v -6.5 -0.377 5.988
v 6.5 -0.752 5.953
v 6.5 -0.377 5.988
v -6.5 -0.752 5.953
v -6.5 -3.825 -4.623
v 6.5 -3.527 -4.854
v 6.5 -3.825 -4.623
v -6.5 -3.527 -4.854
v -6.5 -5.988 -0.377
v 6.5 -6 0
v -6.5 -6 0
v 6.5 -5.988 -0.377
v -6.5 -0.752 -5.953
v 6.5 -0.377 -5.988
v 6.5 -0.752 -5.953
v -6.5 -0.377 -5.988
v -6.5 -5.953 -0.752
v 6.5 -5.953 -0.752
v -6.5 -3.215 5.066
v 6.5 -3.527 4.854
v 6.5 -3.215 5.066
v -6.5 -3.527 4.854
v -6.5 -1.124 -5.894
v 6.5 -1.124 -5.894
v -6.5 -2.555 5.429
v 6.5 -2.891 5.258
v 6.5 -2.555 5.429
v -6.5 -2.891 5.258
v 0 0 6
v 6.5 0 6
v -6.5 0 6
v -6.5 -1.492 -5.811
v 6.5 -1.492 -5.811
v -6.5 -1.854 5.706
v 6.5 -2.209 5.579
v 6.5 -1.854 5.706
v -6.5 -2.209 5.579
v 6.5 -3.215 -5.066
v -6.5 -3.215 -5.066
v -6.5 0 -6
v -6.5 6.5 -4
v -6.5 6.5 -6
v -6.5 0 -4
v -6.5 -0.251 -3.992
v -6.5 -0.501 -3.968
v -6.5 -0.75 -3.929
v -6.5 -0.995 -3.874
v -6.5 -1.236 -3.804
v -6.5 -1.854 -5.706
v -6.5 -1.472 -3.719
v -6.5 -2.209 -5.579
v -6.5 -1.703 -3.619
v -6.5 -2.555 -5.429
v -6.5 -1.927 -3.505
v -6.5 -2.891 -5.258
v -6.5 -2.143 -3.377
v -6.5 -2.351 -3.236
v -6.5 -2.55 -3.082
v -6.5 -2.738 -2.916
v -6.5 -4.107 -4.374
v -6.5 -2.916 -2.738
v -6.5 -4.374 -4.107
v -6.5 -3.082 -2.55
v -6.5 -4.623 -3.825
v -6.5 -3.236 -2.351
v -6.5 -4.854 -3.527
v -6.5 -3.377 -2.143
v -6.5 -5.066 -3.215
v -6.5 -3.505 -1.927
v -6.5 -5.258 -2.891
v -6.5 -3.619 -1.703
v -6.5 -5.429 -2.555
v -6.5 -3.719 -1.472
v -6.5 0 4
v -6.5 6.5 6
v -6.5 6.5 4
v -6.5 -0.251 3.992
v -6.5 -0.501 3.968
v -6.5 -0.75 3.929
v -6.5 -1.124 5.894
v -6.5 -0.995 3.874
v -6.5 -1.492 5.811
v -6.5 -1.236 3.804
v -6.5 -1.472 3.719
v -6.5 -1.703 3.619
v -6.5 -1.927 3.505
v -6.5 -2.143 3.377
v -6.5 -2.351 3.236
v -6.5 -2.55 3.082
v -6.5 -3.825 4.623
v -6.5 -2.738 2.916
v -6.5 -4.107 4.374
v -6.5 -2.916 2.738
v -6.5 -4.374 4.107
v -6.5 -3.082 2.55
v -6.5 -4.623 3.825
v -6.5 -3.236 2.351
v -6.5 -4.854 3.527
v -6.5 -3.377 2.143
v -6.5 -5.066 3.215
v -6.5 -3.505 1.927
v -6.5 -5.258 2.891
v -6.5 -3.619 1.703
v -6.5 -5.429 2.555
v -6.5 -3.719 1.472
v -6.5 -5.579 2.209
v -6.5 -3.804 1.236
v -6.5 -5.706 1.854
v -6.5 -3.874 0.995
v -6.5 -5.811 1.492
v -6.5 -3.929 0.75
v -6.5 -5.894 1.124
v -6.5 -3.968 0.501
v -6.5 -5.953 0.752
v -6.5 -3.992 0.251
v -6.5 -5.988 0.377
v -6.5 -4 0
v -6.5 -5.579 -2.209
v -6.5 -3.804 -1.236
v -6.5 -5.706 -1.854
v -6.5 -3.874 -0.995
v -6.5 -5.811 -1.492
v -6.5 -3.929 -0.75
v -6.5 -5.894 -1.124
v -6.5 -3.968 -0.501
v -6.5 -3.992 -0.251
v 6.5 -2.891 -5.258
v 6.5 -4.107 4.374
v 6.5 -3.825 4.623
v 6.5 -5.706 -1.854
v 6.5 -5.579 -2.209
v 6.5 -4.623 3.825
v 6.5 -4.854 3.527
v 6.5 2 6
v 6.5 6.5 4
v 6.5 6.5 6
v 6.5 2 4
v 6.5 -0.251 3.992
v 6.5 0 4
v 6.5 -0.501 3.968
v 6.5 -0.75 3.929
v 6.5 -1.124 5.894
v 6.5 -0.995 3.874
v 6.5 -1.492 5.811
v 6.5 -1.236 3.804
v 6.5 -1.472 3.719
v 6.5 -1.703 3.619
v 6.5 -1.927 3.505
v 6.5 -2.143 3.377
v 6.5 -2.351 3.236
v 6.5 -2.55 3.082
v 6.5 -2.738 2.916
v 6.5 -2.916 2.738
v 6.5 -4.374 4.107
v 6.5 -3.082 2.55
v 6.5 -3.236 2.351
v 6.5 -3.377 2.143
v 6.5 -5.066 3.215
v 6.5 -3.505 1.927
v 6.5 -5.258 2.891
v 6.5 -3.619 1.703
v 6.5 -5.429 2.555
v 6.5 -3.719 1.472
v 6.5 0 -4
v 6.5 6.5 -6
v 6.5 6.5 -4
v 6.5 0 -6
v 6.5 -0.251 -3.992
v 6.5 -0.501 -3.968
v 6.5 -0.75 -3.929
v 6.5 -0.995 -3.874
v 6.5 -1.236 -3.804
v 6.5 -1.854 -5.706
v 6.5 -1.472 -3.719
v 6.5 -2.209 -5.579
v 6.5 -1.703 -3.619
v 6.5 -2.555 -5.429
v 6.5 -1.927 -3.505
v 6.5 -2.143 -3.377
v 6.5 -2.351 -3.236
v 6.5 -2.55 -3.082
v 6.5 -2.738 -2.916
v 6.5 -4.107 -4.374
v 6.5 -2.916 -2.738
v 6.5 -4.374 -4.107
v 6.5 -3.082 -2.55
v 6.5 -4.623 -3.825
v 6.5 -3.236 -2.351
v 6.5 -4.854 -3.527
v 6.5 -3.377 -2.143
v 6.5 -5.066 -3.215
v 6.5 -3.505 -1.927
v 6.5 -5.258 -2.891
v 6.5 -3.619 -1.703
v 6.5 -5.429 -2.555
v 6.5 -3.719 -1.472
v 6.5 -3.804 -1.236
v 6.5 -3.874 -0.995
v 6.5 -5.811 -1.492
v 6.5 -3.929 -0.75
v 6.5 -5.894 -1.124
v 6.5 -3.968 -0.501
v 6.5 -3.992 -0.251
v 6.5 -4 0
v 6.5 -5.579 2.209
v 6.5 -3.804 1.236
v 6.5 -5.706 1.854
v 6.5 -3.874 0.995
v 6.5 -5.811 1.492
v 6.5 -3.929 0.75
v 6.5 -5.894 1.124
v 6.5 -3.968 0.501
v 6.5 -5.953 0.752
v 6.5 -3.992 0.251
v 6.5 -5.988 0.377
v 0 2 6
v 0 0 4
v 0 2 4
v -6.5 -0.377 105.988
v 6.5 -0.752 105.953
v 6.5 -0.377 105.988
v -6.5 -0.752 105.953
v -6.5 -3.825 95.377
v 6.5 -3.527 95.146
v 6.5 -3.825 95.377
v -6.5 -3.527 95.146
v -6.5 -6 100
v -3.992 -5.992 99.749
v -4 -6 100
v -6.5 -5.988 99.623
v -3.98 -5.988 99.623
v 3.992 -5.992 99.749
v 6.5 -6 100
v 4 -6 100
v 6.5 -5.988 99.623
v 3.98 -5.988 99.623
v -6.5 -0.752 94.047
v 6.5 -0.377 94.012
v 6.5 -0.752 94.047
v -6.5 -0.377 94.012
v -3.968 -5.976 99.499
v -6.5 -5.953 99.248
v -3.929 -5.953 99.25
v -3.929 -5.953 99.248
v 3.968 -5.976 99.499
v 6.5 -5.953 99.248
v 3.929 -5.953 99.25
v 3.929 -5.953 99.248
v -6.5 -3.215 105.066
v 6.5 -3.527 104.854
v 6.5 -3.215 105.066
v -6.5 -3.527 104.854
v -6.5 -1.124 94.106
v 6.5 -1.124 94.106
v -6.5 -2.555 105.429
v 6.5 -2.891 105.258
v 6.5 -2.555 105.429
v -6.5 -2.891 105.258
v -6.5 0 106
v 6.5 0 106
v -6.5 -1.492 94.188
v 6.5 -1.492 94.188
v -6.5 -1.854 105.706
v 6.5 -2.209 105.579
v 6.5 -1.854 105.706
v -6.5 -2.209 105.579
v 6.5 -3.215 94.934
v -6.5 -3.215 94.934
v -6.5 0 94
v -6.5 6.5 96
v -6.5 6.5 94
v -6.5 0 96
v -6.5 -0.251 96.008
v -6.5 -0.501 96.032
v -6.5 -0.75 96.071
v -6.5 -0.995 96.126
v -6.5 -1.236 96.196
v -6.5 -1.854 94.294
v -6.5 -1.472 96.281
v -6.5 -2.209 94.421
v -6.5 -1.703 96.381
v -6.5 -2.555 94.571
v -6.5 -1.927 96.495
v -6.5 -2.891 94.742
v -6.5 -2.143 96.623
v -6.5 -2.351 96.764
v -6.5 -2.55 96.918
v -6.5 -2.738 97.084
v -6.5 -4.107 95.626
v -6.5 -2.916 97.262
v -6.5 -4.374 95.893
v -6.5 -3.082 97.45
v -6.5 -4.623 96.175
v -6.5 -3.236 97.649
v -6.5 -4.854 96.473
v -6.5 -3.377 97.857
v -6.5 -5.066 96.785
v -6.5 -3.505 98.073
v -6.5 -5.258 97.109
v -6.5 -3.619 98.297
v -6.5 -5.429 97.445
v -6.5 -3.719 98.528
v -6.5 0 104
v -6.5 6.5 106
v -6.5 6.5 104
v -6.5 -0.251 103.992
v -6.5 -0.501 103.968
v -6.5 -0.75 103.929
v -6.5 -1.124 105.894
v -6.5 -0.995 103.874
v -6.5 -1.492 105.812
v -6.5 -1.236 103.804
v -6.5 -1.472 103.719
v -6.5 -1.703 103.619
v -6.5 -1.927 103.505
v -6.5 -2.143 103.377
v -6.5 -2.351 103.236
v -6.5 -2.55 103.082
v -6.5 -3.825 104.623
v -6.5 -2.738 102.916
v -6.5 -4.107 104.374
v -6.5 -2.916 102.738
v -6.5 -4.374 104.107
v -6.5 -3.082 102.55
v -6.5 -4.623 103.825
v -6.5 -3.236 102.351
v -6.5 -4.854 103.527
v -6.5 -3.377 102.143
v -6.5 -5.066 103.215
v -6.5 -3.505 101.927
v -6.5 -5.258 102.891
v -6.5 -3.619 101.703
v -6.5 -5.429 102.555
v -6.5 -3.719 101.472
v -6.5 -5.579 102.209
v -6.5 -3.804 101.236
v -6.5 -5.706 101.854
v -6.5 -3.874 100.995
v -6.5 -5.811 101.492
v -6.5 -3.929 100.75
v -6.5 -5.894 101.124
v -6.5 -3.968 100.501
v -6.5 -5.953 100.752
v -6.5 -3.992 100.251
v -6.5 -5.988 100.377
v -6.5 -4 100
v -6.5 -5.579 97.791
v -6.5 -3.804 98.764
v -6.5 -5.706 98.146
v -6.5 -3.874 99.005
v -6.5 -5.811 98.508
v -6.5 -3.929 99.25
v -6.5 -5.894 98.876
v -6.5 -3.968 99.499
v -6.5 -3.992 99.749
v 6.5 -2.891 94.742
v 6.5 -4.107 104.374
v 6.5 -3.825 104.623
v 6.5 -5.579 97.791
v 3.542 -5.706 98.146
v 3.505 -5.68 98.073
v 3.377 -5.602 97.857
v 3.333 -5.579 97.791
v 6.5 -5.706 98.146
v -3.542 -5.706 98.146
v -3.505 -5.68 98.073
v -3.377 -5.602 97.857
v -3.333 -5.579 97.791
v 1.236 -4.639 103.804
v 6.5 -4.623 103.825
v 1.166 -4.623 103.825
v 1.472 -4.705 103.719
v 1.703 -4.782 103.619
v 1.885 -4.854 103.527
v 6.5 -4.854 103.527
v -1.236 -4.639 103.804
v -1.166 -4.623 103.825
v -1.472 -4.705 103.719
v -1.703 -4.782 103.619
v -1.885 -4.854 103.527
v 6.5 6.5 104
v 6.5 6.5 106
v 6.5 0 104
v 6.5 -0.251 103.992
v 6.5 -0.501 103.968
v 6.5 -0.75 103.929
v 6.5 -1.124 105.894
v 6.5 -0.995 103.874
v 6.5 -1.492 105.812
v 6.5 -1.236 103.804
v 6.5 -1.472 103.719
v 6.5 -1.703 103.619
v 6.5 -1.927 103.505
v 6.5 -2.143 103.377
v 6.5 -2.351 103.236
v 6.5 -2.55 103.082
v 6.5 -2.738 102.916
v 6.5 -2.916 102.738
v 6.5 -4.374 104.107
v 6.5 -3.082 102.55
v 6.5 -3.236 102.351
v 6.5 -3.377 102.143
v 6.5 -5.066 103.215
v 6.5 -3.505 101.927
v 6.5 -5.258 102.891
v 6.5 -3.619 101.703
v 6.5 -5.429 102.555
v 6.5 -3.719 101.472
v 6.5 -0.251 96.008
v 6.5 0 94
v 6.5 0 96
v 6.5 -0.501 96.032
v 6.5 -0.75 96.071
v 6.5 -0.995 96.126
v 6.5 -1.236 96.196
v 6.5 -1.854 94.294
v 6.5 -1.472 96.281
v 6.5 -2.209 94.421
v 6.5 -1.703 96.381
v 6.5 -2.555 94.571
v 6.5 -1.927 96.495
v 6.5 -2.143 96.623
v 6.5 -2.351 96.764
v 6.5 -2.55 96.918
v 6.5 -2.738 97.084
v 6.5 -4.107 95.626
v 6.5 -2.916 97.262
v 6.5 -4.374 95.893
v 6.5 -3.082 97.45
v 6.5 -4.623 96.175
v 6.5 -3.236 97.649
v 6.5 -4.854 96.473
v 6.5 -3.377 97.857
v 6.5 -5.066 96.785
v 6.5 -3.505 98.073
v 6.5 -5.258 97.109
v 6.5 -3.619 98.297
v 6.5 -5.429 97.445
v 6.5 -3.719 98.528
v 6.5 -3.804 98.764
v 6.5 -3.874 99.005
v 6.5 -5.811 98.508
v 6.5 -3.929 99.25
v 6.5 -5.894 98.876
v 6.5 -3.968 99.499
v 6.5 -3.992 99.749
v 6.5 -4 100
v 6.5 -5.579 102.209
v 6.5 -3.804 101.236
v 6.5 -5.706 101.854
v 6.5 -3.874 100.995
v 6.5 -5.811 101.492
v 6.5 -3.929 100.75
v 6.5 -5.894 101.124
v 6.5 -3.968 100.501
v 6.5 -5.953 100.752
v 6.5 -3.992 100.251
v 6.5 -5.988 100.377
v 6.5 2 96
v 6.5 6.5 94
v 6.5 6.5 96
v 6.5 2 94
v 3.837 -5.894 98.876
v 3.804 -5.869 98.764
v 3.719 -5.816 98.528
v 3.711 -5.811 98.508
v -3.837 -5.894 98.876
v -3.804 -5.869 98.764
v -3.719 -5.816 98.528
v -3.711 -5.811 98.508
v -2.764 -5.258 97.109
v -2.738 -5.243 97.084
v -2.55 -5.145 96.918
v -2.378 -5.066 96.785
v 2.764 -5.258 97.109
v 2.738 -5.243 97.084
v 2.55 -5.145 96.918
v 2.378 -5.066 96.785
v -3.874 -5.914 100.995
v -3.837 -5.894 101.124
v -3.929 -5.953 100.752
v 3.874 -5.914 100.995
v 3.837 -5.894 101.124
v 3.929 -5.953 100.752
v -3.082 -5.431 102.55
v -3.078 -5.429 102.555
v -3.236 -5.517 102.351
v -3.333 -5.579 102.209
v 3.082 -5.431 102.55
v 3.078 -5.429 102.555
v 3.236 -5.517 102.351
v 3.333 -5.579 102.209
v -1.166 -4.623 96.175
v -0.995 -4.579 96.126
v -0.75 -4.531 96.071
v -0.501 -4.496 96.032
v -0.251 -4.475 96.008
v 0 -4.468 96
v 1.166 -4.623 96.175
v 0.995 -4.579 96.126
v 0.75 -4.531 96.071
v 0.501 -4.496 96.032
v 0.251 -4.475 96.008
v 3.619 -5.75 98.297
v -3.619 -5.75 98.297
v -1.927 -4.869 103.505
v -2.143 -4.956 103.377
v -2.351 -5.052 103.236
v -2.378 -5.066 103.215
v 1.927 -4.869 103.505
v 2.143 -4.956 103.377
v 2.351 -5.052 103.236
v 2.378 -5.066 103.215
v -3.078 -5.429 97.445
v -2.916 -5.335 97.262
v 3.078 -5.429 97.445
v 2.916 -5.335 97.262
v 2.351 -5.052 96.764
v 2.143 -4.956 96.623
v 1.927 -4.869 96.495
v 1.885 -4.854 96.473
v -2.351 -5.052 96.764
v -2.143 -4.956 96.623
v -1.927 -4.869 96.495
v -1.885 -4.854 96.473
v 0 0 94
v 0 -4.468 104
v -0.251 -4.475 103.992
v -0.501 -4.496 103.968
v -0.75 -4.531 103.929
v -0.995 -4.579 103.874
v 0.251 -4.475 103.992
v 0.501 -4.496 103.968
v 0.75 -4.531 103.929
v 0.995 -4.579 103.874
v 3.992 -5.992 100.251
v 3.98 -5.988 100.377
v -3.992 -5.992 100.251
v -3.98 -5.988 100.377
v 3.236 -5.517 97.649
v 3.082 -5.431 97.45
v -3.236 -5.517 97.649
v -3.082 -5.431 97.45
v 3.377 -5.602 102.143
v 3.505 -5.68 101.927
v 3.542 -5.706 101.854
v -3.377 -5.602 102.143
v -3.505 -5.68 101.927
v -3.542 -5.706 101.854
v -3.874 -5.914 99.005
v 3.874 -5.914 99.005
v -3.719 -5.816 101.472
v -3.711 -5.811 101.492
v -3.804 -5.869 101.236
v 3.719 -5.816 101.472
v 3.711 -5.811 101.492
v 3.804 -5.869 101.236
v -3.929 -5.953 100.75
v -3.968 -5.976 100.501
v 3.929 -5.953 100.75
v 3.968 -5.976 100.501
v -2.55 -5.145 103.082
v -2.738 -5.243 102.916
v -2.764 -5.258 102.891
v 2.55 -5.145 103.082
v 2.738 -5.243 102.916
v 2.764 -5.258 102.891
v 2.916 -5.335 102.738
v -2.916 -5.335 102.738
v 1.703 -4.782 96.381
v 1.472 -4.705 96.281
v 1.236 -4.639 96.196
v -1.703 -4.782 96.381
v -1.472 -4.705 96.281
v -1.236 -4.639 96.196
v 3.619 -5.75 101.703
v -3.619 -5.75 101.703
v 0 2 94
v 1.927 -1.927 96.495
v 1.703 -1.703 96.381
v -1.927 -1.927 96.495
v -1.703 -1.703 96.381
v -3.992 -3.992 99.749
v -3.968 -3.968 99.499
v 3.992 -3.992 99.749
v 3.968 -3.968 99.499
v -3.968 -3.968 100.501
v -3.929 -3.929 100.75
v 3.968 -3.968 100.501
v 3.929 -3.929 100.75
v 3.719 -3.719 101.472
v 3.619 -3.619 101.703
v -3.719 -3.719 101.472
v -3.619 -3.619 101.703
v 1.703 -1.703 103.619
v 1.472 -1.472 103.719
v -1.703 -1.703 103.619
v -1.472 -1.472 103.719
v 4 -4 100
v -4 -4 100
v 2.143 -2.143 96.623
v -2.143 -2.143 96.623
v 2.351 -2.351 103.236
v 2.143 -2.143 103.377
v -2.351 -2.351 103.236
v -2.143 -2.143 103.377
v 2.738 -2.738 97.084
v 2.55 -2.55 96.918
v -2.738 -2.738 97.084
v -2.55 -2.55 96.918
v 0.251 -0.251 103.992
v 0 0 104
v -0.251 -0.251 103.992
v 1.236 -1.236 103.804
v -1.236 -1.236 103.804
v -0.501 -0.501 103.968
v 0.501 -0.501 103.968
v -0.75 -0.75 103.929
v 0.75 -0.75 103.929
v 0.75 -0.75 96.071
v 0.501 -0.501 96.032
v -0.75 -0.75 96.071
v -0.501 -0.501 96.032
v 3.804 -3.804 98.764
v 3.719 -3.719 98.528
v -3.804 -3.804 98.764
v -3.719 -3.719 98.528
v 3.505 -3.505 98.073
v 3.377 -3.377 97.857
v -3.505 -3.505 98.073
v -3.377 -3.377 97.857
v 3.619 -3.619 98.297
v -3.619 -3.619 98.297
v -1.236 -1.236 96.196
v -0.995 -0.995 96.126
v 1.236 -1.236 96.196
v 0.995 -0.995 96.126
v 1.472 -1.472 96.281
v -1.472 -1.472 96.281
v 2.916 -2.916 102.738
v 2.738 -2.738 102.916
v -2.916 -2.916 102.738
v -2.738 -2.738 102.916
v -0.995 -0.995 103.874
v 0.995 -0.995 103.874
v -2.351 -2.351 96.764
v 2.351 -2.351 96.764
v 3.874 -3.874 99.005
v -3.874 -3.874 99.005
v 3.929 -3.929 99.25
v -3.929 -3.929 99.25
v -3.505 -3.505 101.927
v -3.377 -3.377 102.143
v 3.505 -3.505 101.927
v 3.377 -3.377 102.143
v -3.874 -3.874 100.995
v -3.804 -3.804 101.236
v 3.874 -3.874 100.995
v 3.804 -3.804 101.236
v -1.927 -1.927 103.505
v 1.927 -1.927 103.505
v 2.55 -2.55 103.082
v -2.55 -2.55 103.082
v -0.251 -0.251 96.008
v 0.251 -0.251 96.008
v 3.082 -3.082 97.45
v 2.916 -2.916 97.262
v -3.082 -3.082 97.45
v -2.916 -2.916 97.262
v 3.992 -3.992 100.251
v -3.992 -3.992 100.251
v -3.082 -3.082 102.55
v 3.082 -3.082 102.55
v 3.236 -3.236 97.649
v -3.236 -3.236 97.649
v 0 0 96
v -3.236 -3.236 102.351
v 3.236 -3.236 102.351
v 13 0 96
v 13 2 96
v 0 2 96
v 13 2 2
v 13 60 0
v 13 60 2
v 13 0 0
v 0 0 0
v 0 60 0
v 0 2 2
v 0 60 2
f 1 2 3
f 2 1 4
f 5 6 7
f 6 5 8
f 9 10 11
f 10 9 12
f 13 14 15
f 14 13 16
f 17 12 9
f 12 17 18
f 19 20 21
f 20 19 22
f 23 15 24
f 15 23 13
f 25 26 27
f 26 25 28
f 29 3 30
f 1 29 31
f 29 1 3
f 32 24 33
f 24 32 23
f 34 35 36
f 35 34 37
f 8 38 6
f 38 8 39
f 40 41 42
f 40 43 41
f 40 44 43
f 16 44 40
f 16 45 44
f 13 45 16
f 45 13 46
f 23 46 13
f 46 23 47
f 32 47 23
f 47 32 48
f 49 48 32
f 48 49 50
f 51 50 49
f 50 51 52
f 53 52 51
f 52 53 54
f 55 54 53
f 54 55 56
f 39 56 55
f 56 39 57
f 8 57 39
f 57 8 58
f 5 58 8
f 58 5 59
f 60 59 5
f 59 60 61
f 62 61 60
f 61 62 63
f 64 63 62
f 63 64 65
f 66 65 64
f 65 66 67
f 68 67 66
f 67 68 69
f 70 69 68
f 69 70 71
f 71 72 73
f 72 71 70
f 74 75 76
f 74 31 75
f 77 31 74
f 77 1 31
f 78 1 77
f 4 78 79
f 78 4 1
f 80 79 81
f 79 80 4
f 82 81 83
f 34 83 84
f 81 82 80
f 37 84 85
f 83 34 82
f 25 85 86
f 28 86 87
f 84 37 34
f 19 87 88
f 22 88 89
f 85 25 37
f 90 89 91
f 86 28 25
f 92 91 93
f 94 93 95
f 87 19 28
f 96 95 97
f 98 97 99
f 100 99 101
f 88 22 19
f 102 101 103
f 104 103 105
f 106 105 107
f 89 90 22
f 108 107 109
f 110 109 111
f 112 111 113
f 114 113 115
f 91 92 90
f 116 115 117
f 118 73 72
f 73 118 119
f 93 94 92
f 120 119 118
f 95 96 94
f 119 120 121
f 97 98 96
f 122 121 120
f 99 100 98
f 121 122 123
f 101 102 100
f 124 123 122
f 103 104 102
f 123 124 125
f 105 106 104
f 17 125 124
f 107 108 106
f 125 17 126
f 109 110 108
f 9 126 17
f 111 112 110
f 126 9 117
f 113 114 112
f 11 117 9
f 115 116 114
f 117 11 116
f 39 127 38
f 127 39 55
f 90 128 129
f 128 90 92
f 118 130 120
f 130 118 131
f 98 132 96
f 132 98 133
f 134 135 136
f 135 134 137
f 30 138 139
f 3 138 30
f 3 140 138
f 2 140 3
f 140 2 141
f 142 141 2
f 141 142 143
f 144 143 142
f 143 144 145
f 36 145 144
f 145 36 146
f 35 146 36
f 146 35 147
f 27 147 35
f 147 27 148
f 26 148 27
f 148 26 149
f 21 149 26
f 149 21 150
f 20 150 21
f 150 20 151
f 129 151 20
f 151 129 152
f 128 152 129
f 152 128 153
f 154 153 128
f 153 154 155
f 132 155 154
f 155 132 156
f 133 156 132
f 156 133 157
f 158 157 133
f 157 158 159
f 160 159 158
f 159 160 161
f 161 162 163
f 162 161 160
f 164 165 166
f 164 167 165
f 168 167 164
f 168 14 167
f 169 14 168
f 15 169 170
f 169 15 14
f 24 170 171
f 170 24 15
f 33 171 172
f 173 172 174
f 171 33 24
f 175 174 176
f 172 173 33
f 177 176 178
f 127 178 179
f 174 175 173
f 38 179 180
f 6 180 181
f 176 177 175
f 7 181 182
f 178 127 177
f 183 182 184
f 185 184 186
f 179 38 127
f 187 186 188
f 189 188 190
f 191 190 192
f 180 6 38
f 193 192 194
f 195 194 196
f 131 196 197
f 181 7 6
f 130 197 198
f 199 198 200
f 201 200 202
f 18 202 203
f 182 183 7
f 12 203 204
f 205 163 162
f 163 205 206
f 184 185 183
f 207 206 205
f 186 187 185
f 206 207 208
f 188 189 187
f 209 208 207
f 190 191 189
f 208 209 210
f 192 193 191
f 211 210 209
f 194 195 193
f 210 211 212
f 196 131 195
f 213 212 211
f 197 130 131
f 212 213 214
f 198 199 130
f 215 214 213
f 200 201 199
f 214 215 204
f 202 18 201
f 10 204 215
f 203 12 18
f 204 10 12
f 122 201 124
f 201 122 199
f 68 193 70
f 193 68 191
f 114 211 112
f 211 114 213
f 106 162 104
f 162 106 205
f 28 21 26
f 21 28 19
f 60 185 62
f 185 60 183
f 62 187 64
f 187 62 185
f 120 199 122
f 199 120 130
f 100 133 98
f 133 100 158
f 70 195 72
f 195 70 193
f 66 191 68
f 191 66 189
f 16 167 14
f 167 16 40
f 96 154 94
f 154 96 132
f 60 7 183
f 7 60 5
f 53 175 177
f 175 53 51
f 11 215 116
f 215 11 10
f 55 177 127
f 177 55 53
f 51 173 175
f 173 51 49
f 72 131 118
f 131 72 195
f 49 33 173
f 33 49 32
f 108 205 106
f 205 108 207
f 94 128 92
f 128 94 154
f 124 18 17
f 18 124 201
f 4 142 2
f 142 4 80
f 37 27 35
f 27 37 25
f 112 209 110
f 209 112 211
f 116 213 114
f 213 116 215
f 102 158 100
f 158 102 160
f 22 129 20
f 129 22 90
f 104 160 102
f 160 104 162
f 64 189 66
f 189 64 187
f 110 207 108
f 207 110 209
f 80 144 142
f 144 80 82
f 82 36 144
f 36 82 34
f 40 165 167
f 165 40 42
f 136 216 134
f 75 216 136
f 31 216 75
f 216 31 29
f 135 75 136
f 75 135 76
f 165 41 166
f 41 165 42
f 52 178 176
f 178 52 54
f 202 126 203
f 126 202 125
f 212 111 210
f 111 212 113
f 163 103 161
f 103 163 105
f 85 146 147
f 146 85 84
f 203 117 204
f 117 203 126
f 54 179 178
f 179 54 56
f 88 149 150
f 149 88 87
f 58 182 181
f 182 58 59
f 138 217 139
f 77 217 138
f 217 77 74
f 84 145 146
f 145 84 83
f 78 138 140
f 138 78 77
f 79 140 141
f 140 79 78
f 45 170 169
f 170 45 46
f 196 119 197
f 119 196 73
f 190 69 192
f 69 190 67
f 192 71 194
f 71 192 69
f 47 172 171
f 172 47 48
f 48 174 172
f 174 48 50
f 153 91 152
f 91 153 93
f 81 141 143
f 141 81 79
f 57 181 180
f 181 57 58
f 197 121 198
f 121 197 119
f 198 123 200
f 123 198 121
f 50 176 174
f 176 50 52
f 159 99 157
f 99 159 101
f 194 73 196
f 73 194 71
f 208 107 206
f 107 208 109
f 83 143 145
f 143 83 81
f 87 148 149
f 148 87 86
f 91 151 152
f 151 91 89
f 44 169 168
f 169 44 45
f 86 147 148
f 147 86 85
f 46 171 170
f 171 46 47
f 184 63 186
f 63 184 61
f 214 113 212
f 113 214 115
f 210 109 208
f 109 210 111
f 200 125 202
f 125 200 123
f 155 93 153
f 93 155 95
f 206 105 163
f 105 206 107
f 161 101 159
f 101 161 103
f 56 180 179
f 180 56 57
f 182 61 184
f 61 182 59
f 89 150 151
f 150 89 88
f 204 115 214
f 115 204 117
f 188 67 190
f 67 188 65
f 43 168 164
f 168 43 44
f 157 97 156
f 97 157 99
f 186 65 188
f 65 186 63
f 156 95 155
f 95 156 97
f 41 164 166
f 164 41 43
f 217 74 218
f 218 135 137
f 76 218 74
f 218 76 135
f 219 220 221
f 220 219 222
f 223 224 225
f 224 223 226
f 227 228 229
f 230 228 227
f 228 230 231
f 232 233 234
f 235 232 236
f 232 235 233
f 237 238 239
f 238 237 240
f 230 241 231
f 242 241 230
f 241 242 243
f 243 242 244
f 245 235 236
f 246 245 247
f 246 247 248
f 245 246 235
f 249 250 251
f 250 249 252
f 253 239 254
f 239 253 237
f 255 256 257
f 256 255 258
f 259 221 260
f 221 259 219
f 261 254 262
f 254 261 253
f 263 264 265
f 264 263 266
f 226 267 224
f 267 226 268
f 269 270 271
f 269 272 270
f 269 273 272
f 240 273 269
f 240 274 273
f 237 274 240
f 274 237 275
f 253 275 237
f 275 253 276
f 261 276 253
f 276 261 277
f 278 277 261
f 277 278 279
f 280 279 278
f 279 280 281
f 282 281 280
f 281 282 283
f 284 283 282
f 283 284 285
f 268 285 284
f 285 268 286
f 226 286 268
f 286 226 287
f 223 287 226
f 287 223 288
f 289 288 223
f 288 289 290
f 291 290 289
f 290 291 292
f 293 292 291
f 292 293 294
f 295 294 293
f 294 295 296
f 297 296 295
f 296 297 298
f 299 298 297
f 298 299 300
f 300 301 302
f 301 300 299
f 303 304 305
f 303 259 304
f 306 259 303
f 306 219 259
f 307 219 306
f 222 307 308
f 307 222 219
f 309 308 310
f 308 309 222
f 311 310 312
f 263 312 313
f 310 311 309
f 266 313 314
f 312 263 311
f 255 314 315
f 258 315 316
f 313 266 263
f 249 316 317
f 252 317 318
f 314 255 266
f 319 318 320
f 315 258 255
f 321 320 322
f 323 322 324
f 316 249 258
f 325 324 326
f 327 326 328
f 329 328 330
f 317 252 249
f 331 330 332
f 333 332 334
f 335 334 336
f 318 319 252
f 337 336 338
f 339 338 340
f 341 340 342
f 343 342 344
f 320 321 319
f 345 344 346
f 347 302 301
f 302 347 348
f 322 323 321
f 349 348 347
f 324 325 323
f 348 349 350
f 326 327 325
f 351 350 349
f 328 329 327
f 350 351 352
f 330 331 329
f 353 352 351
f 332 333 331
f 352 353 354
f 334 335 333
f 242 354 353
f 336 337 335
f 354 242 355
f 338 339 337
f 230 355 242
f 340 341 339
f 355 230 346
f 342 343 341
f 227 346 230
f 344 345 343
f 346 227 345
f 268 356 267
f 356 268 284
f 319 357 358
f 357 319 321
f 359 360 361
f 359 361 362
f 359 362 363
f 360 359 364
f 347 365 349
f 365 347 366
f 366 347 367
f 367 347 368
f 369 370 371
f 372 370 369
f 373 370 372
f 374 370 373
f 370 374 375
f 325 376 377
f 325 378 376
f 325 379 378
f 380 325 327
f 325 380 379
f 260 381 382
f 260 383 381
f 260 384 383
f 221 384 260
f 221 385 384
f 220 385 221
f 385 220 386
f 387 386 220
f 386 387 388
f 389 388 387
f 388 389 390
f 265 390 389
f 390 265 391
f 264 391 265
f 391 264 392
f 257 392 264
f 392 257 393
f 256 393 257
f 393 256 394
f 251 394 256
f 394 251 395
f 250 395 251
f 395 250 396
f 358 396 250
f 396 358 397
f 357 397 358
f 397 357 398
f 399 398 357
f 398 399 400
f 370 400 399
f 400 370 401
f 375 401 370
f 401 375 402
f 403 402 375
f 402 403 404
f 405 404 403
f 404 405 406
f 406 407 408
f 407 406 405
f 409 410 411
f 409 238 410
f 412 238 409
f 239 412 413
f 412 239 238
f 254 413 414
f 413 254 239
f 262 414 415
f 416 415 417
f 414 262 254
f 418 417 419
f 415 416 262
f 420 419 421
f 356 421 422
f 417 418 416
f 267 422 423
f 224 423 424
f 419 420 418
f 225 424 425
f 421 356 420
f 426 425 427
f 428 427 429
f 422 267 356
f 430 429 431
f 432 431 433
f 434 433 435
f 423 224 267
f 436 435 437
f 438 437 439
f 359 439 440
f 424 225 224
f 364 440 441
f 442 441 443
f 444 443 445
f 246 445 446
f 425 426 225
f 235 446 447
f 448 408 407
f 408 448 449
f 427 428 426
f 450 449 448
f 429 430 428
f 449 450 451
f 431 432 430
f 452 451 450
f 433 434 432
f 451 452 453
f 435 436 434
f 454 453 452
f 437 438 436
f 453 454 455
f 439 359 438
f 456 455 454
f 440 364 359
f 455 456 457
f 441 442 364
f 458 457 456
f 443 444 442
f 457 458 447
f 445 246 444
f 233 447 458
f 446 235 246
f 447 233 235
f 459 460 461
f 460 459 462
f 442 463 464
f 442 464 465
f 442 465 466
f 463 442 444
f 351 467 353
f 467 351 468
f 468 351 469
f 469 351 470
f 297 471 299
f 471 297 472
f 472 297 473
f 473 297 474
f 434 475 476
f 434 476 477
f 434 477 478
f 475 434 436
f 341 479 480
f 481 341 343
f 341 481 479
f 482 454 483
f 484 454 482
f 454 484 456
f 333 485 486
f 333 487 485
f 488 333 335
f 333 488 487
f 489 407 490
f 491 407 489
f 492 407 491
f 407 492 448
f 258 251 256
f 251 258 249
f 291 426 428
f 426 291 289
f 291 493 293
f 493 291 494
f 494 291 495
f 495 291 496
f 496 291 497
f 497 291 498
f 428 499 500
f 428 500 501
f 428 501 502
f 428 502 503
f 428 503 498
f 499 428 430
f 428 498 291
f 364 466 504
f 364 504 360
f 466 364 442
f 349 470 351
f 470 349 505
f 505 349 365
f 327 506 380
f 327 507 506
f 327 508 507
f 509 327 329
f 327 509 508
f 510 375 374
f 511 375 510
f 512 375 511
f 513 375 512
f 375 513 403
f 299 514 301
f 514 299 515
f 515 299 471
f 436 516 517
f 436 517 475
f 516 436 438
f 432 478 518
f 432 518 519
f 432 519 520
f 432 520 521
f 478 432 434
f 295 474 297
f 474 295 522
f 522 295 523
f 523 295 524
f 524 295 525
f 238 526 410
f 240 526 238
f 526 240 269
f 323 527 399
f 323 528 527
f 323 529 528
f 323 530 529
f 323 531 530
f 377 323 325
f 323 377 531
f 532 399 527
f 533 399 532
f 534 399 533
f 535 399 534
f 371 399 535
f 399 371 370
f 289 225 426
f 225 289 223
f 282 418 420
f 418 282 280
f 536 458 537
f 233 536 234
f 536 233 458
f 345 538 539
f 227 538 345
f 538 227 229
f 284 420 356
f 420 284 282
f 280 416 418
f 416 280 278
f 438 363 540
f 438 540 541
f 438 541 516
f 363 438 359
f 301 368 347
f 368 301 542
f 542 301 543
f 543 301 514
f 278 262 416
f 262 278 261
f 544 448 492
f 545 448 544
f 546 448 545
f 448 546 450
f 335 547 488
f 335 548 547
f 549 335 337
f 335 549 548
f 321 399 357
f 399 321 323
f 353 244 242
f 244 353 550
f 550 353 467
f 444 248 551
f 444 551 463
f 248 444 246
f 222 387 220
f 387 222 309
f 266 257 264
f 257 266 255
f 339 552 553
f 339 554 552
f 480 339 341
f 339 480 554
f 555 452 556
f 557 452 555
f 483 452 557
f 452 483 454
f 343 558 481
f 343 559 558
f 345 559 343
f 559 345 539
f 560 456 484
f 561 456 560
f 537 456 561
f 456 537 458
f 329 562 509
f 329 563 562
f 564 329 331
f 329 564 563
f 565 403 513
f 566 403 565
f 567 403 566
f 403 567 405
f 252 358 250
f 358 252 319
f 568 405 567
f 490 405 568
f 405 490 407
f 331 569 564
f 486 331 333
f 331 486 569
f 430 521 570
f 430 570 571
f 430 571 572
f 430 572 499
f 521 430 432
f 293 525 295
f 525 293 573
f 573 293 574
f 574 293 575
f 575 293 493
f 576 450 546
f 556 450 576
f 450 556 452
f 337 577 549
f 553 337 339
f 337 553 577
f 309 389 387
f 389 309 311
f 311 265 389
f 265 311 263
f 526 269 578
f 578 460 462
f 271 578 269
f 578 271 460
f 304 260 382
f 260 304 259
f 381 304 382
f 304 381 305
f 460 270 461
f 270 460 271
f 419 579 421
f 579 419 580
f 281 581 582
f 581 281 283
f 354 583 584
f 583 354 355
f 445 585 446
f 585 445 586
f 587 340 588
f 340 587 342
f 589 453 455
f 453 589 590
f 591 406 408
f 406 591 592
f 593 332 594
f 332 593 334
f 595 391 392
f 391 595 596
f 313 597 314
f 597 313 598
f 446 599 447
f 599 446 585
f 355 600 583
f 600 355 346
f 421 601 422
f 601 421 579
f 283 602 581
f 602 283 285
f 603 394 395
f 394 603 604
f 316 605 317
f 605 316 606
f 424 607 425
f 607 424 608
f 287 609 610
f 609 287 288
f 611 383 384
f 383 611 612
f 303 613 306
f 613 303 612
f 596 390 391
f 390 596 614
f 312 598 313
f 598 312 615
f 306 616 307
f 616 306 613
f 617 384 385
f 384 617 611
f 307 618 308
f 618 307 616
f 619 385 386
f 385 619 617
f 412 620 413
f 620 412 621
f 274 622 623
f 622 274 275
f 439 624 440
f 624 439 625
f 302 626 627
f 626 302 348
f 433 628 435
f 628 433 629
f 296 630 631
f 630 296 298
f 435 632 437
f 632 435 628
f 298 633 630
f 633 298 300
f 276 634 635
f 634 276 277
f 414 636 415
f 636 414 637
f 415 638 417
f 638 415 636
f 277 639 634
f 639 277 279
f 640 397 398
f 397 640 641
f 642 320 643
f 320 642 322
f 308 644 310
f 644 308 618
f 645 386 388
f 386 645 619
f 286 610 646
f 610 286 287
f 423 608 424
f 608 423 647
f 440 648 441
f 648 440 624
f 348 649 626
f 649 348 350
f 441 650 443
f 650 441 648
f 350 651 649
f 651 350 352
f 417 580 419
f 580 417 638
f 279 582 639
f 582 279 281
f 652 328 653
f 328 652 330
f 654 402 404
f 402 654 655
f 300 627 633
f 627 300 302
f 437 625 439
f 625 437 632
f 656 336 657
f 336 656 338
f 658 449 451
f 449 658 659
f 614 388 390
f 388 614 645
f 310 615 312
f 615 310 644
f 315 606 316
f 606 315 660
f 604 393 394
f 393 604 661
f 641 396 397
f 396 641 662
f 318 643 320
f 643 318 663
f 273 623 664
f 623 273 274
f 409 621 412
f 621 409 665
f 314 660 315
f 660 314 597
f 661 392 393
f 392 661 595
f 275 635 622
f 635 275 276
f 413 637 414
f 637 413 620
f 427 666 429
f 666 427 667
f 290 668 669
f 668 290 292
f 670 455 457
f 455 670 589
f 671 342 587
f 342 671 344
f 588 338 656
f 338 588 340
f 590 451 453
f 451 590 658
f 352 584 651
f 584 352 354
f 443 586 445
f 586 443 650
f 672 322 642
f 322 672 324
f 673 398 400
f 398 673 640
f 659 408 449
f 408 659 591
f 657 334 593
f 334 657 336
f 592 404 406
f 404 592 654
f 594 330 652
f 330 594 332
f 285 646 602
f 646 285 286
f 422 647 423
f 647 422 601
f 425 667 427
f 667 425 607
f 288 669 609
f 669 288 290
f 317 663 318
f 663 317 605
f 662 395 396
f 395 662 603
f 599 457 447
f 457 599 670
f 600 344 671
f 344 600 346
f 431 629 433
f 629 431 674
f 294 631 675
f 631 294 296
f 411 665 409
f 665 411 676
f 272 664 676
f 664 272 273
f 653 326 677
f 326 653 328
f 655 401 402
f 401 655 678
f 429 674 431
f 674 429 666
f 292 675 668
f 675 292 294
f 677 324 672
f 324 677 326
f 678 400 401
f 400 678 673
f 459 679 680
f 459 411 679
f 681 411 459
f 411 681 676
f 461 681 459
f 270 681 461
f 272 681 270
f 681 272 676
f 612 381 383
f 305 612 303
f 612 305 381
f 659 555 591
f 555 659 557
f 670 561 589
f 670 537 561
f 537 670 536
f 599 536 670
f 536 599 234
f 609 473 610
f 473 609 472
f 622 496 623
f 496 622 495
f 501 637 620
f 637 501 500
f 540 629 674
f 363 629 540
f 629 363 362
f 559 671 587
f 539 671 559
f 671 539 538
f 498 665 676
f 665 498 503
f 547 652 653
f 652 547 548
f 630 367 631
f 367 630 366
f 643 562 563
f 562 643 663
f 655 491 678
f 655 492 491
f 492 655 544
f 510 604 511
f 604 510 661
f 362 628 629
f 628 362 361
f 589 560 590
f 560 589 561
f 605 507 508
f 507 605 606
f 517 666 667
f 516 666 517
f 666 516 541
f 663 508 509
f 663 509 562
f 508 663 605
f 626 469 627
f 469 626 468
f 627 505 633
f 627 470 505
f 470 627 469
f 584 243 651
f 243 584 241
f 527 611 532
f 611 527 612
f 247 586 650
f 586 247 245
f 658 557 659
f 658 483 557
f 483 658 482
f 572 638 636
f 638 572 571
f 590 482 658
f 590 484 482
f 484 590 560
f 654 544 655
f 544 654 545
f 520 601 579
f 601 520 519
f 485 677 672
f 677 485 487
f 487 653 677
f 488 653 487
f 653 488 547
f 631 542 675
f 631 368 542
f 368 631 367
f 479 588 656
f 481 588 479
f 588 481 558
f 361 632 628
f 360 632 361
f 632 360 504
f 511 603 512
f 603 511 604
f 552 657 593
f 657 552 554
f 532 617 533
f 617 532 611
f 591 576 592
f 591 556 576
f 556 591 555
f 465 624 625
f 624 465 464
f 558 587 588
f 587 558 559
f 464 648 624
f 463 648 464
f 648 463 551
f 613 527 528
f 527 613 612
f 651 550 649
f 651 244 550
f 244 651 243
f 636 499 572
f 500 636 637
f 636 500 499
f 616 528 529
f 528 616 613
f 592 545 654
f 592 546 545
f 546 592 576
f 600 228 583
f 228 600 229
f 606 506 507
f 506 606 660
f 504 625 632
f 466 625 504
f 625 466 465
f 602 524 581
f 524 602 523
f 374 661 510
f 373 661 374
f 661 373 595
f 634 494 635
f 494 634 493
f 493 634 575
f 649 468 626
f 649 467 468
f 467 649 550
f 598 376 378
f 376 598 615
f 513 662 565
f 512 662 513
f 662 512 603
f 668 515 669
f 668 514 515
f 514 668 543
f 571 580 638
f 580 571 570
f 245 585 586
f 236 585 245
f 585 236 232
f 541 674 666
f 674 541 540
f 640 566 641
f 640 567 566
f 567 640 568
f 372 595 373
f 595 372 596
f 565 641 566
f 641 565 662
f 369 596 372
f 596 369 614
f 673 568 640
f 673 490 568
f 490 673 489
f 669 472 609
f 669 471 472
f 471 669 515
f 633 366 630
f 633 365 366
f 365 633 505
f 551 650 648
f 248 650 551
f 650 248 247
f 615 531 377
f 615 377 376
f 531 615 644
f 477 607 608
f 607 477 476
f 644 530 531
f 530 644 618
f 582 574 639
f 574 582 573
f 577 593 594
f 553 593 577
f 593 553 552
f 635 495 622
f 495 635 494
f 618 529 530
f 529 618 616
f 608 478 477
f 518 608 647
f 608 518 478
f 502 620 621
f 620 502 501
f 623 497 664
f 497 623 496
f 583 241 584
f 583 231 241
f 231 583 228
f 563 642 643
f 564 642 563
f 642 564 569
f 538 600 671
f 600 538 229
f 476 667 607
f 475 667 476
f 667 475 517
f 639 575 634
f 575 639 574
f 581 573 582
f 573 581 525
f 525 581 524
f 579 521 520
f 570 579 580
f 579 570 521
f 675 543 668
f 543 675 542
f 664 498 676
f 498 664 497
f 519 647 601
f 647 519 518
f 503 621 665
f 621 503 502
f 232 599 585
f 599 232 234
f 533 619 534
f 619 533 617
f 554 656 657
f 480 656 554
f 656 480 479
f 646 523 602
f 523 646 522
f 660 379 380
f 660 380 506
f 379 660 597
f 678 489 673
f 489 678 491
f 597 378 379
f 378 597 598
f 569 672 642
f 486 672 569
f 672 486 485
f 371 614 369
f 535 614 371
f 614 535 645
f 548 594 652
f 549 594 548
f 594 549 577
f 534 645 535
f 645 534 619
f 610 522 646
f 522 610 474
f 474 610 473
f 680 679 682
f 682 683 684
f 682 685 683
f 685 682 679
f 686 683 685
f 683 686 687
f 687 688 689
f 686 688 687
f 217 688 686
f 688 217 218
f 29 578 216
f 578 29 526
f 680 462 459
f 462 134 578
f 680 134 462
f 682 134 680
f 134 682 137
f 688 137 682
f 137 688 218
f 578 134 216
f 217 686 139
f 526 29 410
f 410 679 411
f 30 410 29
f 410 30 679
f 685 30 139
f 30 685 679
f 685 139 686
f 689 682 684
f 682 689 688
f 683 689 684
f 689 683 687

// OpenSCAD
$fn=100;

WIDTH = 13;
THICK = 2;
DHOLE = 8;


//translate([0,0,90])
//difference(){
//cube([10,10,10]);
//translate([0,1.5, 1.5]) cube([10,7,7]);
//}


module foo(){
 
difference(){
    
    hull(){
        cylinder(d=WIDTH, h=DHOLE*1.5);
        translate([0,0,-.5*WIDTH]) cube([WIDTH,THICK, 1], center=true);
    }
    translate([0,0,0.75* DHOLE]) union(){
        translate([-WIDTH/2, 0, 0])    
        rotate([0,90,0]) cylinder(d=DHOLE, h=WIDTH);
        translate([0, WIDTH/2,0]) 
        rotate([90,0,0]) cylinder(d=DHOLE, h=WIDTH);
    }
}
}

module foo2(){
    
    difference() {
    rotate([0,90,0]) union(){
        cylinder(d=WIDTH, h=DHOLE+THICK, center=true);
        translate([0,WIDTH/4,0]) 
        cube([WIDTH, WIDTH/2, DHOLE+THICK], center=true);

    }
    union(){
        translate([-WIDTH/2, 0, 0])    
        rotate([0,90,0]) cylinder(d=DHOLE, h=WIDTH);
        translate([0, WIDTH/2,0]) 
        rotate([90,0,0]) cylinder(d=DHOLE, h=WIDTH);
    }
}

}

module foo3i(){
     rotate([0,90,0])
       difference(){
        union(){
            cylinder(d=DHOLE+2*THICK, h=WIDTH, center=true);
            translate([0,WIDTH/4,0]) 
            cube([DHOLE+2*THICK, WIDTH/2, WIDTH], center=true);
        }
        
       union(){
            // inner
            cylinder(d=DHOLE, h=WIDTH, center=true);
            translate([0,WIDTH/4,0]) 
            cube([DHOLE, WIDTH/2, WIDTH], center=true);

//        translate([0, WIDTH/2,0]) 
//        rotate([90,0,0]) cylinder(d=DHOLE, h=WIDTH);

        }
    }

}

module foo3(){
    
    difference(){
    // outer 
     foo3i();
        translate([0, WIDTH/2,0]) 
        rotate([90,0,0]) cylinder(d=DHOLE, h=WIDTH);
    }

}

foo3i();
cube([WIDTH,THICK, 96]);
//
cube([WIDTH,60, THICK]);
//
translate([0,0,100]) //foo();

foo3();
